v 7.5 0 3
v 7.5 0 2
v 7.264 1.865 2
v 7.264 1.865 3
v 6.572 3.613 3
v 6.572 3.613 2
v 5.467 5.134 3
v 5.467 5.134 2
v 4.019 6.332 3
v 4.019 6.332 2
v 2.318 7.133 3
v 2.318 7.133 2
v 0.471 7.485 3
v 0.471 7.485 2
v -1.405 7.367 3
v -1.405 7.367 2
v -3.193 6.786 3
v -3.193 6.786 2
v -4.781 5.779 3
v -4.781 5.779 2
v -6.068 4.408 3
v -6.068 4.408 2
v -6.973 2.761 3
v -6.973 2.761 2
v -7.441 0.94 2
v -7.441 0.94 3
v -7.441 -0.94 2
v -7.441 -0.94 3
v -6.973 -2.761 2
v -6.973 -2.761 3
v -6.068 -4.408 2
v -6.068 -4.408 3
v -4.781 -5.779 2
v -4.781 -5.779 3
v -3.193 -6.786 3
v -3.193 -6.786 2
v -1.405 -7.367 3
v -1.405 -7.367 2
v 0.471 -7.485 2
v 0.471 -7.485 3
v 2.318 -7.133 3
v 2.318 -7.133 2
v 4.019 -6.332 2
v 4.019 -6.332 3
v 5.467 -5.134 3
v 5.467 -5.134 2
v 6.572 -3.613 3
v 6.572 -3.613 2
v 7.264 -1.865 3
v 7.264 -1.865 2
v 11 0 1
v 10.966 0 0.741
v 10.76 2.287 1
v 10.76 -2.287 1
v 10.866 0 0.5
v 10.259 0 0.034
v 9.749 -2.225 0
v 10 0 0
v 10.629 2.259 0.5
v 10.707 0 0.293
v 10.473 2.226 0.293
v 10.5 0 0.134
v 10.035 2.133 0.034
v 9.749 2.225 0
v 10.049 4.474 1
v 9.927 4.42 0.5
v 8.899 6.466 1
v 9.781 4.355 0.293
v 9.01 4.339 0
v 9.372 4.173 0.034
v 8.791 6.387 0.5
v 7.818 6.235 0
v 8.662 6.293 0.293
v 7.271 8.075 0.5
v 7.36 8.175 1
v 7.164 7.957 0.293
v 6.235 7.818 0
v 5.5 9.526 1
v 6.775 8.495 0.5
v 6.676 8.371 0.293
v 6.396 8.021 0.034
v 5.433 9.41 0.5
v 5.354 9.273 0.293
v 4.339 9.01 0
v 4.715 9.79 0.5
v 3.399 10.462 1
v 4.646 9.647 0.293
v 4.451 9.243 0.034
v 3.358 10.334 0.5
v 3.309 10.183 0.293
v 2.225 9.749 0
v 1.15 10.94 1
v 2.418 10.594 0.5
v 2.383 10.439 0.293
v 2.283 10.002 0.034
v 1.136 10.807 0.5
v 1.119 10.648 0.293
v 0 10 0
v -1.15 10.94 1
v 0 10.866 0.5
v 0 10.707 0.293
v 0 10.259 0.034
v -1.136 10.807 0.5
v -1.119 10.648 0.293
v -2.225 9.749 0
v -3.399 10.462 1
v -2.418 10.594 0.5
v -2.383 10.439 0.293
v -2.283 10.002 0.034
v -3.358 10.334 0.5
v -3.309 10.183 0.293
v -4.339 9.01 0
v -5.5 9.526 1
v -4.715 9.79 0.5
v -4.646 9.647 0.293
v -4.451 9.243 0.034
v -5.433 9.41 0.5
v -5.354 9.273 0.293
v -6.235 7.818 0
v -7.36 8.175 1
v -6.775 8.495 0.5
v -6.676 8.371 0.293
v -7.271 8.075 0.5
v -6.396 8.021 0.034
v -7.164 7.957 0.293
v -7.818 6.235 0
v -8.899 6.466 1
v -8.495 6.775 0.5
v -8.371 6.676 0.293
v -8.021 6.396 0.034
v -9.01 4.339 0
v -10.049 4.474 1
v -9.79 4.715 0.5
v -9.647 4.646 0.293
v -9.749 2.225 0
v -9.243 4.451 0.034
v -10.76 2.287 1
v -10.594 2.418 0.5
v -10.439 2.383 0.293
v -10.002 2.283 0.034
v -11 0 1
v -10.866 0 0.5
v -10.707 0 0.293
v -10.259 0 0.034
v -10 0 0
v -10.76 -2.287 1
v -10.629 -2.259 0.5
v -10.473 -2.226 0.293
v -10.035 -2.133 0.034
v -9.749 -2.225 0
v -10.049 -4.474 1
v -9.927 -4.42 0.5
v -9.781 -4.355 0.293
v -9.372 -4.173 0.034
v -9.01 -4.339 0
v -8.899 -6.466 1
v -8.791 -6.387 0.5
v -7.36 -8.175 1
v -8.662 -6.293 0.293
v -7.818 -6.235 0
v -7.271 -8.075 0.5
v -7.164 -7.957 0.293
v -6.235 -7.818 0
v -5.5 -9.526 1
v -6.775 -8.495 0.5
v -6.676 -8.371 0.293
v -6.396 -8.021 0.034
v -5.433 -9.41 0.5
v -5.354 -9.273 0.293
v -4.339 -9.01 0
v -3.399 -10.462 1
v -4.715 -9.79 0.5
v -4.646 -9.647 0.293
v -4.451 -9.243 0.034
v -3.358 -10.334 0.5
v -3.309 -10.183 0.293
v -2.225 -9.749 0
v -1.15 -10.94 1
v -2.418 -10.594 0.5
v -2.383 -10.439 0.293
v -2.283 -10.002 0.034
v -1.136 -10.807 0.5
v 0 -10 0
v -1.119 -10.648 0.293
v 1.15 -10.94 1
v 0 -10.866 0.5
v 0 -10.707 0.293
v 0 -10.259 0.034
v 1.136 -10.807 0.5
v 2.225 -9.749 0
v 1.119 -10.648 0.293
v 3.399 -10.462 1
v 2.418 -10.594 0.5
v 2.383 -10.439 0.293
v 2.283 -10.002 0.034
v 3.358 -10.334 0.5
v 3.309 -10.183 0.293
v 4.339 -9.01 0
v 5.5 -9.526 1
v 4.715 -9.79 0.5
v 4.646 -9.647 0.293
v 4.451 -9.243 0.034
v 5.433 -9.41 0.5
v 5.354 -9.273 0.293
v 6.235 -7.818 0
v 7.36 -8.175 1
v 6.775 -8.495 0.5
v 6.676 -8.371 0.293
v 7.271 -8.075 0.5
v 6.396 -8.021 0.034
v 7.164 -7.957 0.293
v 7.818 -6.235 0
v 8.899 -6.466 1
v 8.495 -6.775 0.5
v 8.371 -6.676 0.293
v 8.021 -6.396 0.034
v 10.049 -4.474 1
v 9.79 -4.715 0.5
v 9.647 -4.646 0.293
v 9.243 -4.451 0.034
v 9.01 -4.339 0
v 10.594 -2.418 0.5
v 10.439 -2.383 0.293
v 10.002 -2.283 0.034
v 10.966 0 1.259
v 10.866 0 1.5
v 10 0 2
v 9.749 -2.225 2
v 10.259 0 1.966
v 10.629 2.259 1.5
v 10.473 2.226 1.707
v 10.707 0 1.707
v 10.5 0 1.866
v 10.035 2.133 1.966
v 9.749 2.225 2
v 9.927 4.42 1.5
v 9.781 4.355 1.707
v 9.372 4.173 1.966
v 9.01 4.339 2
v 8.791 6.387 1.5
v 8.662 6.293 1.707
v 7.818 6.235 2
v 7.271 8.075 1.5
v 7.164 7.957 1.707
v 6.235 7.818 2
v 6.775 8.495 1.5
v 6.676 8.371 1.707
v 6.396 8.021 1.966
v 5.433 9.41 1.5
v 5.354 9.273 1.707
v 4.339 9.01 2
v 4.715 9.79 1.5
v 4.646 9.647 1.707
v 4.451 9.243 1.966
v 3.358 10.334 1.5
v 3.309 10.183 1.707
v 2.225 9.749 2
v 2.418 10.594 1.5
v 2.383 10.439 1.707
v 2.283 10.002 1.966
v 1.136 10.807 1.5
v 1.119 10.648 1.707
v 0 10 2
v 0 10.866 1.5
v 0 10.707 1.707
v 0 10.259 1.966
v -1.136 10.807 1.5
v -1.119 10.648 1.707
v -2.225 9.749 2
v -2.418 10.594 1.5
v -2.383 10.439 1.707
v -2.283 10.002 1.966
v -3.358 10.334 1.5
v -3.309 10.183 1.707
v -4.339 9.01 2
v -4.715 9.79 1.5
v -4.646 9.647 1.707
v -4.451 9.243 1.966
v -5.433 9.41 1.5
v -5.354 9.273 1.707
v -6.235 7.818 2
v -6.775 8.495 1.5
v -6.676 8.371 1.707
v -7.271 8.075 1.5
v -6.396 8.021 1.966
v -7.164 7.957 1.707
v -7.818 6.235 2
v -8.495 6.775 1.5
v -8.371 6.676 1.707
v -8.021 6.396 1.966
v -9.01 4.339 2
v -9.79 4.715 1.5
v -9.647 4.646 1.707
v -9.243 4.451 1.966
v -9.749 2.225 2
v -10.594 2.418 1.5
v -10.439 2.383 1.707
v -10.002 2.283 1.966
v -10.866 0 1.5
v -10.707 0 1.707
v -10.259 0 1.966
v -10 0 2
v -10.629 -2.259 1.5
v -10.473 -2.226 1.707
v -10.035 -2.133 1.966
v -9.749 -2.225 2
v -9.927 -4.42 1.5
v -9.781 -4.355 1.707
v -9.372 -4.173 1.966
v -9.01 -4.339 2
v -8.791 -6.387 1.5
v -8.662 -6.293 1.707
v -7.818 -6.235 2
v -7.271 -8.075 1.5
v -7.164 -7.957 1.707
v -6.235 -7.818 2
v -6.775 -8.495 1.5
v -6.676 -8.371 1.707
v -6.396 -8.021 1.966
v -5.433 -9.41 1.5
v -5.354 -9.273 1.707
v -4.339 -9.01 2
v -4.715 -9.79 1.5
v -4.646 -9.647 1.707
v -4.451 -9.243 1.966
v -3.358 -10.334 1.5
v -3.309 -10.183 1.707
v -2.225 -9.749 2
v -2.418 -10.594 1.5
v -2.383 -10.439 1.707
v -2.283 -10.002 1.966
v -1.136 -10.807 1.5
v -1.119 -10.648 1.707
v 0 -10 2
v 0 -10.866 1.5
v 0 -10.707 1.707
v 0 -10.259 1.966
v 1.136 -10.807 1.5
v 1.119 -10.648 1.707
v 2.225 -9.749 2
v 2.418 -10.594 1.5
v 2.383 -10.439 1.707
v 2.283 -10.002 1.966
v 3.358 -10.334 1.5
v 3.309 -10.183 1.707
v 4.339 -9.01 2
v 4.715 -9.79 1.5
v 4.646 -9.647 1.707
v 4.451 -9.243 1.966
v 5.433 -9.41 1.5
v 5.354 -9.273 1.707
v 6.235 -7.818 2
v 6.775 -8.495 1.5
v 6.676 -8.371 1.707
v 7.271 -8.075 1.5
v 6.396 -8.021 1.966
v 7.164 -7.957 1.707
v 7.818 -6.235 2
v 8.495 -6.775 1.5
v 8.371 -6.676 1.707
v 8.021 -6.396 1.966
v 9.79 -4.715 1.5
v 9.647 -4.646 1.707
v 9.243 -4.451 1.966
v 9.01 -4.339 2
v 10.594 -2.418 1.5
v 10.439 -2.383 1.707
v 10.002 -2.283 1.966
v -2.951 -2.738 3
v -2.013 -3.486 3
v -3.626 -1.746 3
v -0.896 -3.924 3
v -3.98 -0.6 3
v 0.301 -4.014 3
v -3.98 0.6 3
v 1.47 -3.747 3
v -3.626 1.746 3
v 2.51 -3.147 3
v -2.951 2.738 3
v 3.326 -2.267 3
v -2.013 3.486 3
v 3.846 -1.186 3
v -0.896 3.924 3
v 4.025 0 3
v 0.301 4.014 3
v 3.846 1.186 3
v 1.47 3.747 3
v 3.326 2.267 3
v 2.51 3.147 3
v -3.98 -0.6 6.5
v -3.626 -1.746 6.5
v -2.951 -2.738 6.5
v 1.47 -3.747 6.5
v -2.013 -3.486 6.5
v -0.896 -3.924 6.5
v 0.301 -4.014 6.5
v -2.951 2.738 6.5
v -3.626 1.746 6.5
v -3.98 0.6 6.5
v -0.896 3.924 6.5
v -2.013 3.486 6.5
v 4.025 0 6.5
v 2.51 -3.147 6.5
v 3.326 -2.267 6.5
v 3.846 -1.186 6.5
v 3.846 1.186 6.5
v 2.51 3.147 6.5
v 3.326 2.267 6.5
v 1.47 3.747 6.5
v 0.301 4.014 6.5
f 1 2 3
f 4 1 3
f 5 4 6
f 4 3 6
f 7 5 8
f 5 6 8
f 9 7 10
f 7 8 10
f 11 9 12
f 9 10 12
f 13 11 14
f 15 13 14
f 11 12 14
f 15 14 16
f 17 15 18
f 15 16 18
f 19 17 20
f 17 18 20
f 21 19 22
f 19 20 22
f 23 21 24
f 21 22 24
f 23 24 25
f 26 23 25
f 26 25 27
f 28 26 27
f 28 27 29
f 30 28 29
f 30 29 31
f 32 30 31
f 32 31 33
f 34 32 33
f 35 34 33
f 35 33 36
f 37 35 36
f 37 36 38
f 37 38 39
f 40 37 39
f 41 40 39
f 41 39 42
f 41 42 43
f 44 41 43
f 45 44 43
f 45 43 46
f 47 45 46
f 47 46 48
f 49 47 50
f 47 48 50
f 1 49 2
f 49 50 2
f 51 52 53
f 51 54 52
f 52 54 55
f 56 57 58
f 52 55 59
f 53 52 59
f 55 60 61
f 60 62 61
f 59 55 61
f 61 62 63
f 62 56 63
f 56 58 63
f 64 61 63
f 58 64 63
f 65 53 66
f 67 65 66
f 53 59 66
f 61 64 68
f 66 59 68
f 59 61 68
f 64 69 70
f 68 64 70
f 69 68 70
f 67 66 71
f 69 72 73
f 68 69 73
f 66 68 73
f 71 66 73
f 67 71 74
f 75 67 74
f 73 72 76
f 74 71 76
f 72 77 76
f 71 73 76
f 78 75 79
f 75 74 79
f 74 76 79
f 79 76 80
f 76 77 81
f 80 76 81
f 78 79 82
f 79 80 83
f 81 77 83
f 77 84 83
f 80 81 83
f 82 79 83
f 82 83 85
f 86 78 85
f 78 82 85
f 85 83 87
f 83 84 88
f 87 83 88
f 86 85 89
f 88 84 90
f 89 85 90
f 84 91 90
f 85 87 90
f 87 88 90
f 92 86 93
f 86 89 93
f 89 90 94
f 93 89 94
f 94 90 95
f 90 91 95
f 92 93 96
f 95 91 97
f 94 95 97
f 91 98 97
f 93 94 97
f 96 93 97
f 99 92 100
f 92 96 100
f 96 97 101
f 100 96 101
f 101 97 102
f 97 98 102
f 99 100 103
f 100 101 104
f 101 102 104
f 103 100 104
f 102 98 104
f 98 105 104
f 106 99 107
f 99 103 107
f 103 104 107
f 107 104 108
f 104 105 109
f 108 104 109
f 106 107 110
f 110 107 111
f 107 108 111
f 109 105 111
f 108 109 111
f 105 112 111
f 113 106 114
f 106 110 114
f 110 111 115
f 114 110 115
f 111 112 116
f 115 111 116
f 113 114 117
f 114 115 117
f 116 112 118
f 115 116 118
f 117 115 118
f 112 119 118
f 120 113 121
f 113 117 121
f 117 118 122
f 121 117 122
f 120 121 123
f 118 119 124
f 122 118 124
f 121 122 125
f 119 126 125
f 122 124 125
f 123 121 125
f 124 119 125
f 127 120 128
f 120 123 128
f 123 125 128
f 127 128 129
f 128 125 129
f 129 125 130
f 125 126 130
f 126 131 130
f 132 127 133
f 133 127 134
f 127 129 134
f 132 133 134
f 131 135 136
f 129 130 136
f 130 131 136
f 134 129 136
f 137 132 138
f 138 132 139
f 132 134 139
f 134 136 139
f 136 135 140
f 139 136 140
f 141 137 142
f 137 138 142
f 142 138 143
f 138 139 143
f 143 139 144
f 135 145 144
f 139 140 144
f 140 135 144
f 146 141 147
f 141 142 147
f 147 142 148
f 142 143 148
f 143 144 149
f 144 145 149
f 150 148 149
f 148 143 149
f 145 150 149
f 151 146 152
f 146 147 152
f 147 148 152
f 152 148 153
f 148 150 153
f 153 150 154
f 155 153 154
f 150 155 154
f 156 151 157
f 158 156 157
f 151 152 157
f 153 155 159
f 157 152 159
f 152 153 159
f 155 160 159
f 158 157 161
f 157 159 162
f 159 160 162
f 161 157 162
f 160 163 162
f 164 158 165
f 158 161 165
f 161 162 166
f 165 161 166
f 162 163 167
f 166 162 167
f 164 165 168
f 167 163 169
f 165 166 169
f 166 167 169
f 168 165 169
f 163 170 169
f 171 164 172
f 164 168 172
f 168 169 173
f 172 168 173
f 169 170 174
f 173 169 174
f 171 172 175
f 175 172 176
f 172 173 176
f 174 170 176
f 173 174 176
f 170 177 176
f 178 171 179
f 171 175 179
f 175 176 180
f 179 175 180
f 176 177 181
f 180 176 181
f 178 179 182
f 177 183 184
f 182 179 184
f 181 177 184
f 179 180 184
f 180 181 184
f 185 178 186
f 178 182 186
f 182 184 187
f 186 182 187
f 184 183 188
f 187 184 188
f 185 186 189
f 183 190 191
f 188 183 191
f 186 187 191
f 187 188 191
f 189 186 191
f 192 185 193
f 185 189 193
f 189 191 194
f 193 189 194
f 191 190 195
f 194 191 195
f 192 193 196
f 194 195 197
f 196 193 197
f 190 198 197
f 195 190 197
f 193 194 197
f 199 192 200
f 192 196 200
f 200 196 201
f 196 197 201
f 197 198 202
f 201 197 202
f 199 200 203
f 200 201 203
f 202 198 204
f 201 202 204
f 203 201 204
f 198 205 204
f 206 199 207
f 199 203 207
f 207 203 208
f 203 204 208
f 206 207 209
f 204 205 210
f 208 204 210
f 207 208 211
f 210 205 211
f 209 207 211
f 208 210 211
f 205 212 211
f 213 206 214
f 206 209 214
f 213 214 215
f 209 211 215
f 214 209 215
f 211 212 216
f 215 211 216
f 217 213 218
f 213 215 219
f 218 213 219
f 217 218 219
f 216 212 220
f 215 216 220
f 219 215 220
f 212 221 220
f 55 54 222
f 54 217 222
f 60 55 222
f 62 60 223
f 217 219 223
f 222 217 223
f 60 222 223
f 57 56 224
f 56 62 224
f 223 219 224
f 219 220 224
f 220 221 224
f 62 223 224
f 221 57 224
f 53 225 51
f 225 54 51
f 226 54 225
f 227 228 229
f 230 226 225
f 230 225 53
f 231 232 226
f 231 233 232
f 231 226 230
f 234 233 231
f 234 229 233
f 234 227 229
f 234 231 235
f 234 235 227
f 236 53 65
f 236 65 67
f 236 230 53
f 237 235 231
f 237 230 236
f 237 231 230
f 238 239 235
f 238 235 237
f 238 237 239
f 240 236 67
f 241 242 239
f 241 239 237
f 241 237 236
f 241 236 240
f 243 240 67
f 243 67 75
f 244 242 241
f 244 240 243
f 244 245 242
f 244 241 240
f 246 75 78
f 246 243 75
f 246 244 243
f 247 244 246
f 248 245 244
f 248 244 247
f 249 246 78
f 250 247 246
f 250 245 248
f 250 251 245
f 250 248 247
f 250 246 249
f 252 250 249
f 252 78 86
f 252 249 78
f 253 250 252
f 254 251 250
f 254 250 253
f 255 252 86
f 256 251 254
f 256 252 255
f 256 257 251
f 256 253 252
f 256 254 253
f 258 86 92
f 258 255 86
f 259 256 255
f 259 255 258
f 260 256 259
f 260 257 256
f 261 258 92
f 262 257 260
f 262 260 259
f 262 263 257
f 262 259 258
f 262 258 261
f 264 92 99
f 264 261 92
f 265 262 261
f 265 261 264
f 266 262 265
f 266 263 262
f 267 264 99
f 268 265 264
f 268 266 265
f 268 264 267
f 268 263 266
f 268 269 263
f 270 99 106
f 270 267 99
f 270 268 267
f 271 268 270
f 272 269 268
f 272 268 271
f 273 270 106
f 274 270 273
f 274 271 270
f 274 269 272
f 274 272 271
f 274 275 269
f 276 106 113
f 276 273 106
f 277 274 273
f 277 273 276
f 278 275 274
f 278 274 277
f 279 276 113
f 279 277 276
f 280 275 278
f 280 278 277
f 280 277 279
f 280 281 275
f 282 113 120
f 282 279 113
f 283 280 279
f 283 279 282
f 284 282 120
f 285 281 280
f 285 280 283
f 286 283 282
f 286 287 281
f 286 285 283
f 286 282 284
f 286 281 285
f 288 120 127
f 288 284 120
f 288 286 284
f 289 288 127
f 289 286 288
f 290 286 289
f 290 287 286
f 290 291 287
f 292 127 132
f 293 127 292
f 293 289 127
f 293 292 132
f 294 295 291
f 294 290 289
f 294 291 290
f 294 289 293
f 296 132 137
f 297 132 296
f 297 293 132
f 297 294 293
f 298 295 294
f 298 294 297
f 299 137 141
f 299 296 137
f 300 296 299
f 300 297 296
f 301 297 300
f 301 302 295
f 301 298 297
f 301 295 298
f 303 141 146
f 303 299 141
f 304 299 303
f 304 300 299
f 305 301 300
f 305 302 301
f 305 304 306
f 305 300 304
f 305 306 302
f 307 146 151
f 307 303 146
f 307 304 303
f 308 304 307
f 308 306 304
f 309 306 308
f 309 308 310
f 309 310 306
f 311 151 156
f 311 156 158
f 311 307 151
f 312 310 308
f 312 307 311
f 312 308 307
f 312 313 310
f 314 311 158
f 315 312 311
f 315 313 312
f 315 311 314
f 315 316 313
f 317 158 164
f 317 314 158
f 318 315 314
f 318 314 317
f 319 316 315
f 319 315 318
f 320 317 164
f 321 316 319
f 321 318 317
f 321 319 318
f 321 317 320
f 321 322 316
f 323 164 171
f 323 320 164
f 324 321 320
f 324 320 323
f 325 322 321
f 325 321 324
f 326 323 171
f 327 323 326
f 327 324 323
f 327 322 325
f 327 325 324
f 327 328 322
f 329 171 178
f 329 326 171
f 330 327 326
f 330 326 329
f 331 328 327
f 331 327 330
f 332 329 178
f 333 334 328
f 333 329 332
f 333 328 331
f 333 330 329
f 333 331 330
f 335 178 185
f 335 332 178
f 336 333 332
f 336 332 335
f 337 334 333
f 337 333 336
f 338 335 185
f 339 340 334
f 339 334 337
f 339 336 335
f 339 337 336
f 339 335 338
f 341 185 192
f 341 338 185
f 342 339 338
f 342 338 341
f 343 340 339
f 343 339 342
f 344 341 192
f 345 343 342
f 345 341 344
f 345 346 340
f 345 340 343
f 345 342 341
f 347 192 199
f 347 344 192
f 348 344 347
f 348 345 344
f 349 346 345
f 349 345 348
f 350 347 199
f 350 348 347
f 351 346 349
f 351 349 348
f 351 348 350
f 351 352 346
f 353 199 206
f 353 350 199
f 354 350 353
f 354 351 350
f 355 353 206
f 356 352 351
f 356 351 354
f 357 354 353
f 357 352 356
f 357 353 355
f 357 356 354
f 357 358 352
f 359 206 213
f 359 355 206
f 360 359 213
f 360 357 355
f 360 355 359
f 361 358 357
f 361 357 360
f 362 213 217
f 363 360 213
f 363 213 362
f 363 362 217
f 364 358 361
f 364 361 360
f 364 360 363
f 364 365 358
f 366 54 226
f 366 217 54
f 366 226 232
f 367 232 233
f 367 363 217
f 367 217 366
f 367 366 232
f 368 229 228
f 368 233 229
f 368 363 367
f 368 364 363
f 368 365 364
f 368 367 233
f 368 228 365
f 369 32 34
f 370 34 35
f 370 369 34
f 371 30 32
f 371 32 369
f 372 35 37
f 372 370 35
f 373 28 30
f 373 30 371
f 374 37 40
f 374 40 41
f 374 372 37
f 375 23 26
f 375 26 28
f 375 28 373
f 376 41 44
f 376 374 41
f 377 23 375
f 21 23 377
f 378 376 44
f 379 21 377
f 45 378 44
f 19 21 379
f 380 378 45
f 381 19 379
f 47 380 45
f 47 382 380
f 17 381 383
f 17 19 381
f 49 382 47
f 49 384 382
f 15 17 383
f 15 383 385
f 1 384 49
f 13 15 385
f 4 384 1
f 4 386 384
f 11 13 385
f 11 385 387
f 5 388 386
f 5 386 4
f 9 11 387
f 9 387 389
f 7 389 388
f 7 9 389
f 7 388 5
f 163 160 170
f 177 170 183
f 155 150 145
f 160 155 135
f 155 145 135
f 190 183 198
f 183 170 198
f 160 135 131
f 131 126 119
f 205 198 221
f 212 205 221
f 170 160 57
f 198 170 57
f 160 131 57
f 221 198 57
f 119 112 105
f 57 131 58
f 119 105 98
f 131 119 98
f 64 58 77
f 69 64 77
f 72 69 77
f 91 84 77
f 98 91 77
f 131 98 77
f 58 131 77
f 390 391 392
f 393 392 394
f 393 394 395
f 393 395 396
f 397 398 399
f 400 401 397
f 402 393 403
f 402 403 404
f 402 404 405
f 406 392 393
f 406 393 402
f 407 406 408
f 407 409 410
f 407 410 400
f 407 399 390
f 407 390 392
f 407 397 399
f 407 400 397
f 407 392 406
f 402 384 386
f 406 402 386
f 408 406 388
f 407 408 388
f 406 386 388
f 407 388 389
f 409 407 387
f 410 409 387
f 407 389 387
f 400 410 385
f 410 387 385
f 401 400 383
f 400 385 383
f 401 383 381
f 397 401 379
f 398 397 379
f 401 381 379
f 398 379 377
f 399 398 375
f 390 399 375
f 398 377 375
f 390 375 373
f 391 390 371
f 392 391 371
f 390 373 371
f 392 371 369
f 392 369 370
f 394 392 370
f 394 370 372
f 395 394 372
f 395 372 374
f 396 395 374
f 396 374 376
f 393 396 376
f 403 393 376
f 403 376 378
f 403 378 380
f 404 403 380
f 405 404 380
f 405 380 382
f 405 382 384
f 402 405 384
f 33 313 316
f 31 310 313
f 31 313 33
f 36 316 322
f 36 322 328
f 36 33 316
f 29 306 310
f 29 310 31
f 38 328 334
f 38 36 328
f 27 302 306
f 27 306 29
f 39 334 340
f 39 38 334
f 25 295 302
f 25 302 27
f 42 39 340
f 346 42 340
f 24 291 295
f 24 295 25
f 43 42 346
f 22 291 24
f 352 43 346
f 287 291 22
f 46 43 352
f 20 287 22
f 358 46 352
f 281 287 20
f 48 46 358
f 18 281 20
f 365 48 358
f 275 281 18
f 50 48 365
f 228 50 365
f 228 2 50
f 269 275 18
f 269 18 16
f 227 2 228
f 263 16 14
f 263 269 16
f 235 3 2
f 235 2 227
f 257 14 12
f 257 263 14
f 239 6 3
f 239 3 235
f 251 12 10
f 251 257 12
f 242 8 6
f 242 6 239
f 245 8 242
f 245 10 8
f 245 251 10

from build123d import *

# Parameters (mm, degrees)
F0_R     = 4.025
F1_DEPTH = 6.5
F0_R_2   = 7.5
F2_DEPTH = 3
F0_R_3   = 11
F3_DEPTH = 2
F4_R     = 0.99999


# Not quite as in the source:
# - a fillet or chamfer is up to 0.001 mm smaller than in the source, because OpenCascade refuses the exact size


with BuildPart() as f1:
    # F0 (on Top) → F1 (new body)
    with BuildSketch(Plane.XY):
        Circle(F0_R)
    extrude(amount=F1_DEPTH)

    # F0 (on Top) → F2 (join)
    with BuildSketch(Plane.XY):
        Circle(F0_R_2)
        Circle(F0_R, mode=Mode.SUBTRACT)
    extrude(amount=F2_DEPTH)

    # F0 (on Top) → F3 (join)
    with BuildSketch(Plane.XY):
        Circle(F0_R_3)
        Circle(F0_R_2, mode=Mode.SUBTRACT)
    extrude(amount=F3_DEPTH)

    # F4 (radius 1 in the source; OpenCascade refuses exactly that, so slightly less here)
    f4_edges = [f1.edges().sort_by_distance(p)[0] for p in [
        (-11, 0, 2),
        (-11, 0, 0),
    ]]
    fillet(f4_edges, radius=F4_R)


solid = f1.part
